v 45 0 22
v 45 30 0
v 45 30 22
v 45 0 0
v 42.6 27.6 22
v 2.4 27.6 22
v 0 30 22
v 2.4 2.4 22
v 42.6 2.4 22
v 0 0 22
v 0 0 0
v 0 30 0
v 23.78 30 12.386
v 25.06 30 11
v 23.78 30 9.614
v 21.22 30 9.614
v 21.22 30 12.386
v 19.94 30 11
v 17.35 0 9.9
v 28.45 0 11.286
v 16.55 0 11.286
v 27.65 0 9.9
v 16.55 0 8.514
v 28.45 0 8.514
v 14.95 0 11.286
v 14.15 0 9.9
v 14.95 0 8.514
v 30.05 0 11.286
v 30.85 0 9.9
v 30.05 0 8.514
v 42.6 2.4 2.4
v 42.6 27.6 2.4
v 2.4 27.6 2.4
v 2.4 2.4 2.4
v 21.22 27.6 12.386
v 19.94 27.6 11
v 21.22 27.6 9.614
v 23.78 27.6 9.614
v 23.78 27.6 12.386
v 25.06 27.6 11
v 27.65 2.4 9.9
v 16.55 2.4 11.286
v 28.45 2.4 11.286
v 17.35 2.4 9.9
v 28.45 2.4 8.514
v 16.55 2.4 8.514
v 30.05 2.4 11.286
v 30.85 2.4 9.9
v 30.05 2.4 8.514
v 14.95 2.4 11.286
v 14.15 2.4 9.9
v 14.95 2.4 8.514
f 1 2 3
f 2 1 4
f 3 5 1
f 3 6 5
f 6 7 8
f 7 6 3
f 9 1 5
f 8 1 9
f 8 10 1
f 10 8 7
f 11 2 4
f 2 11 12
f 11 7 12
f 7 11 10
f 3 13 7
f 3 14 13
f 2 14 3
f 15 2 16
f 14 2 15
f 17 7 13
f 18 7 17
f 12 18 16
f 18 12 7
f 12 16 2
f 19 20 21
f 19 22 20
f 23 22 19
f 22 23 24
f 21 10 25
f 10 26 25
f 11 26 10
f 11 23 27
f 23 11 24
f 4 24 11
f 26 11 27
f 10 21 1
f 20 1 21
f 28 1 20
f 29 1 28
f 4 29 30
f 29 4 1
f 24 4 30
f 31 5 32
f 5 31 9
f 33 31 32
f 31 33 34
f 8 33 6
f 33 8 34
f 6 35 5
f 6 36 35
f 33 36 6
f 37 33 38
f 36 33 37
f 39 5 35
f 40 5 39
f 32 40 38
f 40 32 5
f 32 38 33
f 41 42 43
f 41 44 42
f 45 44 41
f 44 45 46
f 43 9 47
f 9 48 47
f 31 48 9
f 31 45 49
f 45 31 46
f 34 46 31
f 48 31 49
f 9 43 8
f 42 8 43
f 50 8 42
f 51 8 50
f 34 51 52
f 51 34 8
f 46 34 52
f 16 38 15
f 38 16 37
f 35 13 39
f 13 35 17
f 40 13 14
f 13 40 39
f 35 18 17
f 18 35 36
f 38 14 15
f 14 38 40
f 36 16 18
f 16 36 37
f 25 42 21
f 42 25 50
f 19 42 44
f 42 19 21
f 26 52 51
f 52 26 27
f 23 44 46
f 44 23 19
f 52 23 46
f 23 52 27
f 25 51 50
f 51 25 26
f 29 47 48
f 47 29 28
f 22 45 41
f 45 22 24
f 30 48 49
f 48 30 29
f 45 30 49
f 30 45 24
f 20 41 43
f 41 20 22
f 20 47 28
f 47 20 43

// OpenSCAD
// Prechodova krabicka u radiatoru: prichod silne dvourilky + konektor pohonu
// PETG (tezsi teplotni okoli radiátoru). Tisk: doly na stul, 3 steny, 20%.
L = 45; W = 30; H = 22; wall = 2.4; clearance = 0.3;
difference() {
  cube([L, W, H]);
  translate([wall, wall, wall])
    cube([L-2*wall, W-2*wall, H-wall+clearance]);
  // kabelovy pruchod (silna linka) — 1 oval 5x3.2
  translate([L/2, W-wall/2, H/2]) rotate([90,0,0])
    scale([1.6,1,1]) cylinder(h=wall*2+0.4, d=3.2, center=true);
  // prechod na konektor pohonu — 2x 3.2 vpredu
  translate([L*0.35, wall/2, H*0.45]) rotate([90,0,0])
    cylinder(h=wall+0.4, d=3.2, center=true);
  translate([L*0.65, wall/2, H*0.45]) rotate([90,0,0])
    cylinder(h=wall+0.4, d=3.2, center=true);
}
